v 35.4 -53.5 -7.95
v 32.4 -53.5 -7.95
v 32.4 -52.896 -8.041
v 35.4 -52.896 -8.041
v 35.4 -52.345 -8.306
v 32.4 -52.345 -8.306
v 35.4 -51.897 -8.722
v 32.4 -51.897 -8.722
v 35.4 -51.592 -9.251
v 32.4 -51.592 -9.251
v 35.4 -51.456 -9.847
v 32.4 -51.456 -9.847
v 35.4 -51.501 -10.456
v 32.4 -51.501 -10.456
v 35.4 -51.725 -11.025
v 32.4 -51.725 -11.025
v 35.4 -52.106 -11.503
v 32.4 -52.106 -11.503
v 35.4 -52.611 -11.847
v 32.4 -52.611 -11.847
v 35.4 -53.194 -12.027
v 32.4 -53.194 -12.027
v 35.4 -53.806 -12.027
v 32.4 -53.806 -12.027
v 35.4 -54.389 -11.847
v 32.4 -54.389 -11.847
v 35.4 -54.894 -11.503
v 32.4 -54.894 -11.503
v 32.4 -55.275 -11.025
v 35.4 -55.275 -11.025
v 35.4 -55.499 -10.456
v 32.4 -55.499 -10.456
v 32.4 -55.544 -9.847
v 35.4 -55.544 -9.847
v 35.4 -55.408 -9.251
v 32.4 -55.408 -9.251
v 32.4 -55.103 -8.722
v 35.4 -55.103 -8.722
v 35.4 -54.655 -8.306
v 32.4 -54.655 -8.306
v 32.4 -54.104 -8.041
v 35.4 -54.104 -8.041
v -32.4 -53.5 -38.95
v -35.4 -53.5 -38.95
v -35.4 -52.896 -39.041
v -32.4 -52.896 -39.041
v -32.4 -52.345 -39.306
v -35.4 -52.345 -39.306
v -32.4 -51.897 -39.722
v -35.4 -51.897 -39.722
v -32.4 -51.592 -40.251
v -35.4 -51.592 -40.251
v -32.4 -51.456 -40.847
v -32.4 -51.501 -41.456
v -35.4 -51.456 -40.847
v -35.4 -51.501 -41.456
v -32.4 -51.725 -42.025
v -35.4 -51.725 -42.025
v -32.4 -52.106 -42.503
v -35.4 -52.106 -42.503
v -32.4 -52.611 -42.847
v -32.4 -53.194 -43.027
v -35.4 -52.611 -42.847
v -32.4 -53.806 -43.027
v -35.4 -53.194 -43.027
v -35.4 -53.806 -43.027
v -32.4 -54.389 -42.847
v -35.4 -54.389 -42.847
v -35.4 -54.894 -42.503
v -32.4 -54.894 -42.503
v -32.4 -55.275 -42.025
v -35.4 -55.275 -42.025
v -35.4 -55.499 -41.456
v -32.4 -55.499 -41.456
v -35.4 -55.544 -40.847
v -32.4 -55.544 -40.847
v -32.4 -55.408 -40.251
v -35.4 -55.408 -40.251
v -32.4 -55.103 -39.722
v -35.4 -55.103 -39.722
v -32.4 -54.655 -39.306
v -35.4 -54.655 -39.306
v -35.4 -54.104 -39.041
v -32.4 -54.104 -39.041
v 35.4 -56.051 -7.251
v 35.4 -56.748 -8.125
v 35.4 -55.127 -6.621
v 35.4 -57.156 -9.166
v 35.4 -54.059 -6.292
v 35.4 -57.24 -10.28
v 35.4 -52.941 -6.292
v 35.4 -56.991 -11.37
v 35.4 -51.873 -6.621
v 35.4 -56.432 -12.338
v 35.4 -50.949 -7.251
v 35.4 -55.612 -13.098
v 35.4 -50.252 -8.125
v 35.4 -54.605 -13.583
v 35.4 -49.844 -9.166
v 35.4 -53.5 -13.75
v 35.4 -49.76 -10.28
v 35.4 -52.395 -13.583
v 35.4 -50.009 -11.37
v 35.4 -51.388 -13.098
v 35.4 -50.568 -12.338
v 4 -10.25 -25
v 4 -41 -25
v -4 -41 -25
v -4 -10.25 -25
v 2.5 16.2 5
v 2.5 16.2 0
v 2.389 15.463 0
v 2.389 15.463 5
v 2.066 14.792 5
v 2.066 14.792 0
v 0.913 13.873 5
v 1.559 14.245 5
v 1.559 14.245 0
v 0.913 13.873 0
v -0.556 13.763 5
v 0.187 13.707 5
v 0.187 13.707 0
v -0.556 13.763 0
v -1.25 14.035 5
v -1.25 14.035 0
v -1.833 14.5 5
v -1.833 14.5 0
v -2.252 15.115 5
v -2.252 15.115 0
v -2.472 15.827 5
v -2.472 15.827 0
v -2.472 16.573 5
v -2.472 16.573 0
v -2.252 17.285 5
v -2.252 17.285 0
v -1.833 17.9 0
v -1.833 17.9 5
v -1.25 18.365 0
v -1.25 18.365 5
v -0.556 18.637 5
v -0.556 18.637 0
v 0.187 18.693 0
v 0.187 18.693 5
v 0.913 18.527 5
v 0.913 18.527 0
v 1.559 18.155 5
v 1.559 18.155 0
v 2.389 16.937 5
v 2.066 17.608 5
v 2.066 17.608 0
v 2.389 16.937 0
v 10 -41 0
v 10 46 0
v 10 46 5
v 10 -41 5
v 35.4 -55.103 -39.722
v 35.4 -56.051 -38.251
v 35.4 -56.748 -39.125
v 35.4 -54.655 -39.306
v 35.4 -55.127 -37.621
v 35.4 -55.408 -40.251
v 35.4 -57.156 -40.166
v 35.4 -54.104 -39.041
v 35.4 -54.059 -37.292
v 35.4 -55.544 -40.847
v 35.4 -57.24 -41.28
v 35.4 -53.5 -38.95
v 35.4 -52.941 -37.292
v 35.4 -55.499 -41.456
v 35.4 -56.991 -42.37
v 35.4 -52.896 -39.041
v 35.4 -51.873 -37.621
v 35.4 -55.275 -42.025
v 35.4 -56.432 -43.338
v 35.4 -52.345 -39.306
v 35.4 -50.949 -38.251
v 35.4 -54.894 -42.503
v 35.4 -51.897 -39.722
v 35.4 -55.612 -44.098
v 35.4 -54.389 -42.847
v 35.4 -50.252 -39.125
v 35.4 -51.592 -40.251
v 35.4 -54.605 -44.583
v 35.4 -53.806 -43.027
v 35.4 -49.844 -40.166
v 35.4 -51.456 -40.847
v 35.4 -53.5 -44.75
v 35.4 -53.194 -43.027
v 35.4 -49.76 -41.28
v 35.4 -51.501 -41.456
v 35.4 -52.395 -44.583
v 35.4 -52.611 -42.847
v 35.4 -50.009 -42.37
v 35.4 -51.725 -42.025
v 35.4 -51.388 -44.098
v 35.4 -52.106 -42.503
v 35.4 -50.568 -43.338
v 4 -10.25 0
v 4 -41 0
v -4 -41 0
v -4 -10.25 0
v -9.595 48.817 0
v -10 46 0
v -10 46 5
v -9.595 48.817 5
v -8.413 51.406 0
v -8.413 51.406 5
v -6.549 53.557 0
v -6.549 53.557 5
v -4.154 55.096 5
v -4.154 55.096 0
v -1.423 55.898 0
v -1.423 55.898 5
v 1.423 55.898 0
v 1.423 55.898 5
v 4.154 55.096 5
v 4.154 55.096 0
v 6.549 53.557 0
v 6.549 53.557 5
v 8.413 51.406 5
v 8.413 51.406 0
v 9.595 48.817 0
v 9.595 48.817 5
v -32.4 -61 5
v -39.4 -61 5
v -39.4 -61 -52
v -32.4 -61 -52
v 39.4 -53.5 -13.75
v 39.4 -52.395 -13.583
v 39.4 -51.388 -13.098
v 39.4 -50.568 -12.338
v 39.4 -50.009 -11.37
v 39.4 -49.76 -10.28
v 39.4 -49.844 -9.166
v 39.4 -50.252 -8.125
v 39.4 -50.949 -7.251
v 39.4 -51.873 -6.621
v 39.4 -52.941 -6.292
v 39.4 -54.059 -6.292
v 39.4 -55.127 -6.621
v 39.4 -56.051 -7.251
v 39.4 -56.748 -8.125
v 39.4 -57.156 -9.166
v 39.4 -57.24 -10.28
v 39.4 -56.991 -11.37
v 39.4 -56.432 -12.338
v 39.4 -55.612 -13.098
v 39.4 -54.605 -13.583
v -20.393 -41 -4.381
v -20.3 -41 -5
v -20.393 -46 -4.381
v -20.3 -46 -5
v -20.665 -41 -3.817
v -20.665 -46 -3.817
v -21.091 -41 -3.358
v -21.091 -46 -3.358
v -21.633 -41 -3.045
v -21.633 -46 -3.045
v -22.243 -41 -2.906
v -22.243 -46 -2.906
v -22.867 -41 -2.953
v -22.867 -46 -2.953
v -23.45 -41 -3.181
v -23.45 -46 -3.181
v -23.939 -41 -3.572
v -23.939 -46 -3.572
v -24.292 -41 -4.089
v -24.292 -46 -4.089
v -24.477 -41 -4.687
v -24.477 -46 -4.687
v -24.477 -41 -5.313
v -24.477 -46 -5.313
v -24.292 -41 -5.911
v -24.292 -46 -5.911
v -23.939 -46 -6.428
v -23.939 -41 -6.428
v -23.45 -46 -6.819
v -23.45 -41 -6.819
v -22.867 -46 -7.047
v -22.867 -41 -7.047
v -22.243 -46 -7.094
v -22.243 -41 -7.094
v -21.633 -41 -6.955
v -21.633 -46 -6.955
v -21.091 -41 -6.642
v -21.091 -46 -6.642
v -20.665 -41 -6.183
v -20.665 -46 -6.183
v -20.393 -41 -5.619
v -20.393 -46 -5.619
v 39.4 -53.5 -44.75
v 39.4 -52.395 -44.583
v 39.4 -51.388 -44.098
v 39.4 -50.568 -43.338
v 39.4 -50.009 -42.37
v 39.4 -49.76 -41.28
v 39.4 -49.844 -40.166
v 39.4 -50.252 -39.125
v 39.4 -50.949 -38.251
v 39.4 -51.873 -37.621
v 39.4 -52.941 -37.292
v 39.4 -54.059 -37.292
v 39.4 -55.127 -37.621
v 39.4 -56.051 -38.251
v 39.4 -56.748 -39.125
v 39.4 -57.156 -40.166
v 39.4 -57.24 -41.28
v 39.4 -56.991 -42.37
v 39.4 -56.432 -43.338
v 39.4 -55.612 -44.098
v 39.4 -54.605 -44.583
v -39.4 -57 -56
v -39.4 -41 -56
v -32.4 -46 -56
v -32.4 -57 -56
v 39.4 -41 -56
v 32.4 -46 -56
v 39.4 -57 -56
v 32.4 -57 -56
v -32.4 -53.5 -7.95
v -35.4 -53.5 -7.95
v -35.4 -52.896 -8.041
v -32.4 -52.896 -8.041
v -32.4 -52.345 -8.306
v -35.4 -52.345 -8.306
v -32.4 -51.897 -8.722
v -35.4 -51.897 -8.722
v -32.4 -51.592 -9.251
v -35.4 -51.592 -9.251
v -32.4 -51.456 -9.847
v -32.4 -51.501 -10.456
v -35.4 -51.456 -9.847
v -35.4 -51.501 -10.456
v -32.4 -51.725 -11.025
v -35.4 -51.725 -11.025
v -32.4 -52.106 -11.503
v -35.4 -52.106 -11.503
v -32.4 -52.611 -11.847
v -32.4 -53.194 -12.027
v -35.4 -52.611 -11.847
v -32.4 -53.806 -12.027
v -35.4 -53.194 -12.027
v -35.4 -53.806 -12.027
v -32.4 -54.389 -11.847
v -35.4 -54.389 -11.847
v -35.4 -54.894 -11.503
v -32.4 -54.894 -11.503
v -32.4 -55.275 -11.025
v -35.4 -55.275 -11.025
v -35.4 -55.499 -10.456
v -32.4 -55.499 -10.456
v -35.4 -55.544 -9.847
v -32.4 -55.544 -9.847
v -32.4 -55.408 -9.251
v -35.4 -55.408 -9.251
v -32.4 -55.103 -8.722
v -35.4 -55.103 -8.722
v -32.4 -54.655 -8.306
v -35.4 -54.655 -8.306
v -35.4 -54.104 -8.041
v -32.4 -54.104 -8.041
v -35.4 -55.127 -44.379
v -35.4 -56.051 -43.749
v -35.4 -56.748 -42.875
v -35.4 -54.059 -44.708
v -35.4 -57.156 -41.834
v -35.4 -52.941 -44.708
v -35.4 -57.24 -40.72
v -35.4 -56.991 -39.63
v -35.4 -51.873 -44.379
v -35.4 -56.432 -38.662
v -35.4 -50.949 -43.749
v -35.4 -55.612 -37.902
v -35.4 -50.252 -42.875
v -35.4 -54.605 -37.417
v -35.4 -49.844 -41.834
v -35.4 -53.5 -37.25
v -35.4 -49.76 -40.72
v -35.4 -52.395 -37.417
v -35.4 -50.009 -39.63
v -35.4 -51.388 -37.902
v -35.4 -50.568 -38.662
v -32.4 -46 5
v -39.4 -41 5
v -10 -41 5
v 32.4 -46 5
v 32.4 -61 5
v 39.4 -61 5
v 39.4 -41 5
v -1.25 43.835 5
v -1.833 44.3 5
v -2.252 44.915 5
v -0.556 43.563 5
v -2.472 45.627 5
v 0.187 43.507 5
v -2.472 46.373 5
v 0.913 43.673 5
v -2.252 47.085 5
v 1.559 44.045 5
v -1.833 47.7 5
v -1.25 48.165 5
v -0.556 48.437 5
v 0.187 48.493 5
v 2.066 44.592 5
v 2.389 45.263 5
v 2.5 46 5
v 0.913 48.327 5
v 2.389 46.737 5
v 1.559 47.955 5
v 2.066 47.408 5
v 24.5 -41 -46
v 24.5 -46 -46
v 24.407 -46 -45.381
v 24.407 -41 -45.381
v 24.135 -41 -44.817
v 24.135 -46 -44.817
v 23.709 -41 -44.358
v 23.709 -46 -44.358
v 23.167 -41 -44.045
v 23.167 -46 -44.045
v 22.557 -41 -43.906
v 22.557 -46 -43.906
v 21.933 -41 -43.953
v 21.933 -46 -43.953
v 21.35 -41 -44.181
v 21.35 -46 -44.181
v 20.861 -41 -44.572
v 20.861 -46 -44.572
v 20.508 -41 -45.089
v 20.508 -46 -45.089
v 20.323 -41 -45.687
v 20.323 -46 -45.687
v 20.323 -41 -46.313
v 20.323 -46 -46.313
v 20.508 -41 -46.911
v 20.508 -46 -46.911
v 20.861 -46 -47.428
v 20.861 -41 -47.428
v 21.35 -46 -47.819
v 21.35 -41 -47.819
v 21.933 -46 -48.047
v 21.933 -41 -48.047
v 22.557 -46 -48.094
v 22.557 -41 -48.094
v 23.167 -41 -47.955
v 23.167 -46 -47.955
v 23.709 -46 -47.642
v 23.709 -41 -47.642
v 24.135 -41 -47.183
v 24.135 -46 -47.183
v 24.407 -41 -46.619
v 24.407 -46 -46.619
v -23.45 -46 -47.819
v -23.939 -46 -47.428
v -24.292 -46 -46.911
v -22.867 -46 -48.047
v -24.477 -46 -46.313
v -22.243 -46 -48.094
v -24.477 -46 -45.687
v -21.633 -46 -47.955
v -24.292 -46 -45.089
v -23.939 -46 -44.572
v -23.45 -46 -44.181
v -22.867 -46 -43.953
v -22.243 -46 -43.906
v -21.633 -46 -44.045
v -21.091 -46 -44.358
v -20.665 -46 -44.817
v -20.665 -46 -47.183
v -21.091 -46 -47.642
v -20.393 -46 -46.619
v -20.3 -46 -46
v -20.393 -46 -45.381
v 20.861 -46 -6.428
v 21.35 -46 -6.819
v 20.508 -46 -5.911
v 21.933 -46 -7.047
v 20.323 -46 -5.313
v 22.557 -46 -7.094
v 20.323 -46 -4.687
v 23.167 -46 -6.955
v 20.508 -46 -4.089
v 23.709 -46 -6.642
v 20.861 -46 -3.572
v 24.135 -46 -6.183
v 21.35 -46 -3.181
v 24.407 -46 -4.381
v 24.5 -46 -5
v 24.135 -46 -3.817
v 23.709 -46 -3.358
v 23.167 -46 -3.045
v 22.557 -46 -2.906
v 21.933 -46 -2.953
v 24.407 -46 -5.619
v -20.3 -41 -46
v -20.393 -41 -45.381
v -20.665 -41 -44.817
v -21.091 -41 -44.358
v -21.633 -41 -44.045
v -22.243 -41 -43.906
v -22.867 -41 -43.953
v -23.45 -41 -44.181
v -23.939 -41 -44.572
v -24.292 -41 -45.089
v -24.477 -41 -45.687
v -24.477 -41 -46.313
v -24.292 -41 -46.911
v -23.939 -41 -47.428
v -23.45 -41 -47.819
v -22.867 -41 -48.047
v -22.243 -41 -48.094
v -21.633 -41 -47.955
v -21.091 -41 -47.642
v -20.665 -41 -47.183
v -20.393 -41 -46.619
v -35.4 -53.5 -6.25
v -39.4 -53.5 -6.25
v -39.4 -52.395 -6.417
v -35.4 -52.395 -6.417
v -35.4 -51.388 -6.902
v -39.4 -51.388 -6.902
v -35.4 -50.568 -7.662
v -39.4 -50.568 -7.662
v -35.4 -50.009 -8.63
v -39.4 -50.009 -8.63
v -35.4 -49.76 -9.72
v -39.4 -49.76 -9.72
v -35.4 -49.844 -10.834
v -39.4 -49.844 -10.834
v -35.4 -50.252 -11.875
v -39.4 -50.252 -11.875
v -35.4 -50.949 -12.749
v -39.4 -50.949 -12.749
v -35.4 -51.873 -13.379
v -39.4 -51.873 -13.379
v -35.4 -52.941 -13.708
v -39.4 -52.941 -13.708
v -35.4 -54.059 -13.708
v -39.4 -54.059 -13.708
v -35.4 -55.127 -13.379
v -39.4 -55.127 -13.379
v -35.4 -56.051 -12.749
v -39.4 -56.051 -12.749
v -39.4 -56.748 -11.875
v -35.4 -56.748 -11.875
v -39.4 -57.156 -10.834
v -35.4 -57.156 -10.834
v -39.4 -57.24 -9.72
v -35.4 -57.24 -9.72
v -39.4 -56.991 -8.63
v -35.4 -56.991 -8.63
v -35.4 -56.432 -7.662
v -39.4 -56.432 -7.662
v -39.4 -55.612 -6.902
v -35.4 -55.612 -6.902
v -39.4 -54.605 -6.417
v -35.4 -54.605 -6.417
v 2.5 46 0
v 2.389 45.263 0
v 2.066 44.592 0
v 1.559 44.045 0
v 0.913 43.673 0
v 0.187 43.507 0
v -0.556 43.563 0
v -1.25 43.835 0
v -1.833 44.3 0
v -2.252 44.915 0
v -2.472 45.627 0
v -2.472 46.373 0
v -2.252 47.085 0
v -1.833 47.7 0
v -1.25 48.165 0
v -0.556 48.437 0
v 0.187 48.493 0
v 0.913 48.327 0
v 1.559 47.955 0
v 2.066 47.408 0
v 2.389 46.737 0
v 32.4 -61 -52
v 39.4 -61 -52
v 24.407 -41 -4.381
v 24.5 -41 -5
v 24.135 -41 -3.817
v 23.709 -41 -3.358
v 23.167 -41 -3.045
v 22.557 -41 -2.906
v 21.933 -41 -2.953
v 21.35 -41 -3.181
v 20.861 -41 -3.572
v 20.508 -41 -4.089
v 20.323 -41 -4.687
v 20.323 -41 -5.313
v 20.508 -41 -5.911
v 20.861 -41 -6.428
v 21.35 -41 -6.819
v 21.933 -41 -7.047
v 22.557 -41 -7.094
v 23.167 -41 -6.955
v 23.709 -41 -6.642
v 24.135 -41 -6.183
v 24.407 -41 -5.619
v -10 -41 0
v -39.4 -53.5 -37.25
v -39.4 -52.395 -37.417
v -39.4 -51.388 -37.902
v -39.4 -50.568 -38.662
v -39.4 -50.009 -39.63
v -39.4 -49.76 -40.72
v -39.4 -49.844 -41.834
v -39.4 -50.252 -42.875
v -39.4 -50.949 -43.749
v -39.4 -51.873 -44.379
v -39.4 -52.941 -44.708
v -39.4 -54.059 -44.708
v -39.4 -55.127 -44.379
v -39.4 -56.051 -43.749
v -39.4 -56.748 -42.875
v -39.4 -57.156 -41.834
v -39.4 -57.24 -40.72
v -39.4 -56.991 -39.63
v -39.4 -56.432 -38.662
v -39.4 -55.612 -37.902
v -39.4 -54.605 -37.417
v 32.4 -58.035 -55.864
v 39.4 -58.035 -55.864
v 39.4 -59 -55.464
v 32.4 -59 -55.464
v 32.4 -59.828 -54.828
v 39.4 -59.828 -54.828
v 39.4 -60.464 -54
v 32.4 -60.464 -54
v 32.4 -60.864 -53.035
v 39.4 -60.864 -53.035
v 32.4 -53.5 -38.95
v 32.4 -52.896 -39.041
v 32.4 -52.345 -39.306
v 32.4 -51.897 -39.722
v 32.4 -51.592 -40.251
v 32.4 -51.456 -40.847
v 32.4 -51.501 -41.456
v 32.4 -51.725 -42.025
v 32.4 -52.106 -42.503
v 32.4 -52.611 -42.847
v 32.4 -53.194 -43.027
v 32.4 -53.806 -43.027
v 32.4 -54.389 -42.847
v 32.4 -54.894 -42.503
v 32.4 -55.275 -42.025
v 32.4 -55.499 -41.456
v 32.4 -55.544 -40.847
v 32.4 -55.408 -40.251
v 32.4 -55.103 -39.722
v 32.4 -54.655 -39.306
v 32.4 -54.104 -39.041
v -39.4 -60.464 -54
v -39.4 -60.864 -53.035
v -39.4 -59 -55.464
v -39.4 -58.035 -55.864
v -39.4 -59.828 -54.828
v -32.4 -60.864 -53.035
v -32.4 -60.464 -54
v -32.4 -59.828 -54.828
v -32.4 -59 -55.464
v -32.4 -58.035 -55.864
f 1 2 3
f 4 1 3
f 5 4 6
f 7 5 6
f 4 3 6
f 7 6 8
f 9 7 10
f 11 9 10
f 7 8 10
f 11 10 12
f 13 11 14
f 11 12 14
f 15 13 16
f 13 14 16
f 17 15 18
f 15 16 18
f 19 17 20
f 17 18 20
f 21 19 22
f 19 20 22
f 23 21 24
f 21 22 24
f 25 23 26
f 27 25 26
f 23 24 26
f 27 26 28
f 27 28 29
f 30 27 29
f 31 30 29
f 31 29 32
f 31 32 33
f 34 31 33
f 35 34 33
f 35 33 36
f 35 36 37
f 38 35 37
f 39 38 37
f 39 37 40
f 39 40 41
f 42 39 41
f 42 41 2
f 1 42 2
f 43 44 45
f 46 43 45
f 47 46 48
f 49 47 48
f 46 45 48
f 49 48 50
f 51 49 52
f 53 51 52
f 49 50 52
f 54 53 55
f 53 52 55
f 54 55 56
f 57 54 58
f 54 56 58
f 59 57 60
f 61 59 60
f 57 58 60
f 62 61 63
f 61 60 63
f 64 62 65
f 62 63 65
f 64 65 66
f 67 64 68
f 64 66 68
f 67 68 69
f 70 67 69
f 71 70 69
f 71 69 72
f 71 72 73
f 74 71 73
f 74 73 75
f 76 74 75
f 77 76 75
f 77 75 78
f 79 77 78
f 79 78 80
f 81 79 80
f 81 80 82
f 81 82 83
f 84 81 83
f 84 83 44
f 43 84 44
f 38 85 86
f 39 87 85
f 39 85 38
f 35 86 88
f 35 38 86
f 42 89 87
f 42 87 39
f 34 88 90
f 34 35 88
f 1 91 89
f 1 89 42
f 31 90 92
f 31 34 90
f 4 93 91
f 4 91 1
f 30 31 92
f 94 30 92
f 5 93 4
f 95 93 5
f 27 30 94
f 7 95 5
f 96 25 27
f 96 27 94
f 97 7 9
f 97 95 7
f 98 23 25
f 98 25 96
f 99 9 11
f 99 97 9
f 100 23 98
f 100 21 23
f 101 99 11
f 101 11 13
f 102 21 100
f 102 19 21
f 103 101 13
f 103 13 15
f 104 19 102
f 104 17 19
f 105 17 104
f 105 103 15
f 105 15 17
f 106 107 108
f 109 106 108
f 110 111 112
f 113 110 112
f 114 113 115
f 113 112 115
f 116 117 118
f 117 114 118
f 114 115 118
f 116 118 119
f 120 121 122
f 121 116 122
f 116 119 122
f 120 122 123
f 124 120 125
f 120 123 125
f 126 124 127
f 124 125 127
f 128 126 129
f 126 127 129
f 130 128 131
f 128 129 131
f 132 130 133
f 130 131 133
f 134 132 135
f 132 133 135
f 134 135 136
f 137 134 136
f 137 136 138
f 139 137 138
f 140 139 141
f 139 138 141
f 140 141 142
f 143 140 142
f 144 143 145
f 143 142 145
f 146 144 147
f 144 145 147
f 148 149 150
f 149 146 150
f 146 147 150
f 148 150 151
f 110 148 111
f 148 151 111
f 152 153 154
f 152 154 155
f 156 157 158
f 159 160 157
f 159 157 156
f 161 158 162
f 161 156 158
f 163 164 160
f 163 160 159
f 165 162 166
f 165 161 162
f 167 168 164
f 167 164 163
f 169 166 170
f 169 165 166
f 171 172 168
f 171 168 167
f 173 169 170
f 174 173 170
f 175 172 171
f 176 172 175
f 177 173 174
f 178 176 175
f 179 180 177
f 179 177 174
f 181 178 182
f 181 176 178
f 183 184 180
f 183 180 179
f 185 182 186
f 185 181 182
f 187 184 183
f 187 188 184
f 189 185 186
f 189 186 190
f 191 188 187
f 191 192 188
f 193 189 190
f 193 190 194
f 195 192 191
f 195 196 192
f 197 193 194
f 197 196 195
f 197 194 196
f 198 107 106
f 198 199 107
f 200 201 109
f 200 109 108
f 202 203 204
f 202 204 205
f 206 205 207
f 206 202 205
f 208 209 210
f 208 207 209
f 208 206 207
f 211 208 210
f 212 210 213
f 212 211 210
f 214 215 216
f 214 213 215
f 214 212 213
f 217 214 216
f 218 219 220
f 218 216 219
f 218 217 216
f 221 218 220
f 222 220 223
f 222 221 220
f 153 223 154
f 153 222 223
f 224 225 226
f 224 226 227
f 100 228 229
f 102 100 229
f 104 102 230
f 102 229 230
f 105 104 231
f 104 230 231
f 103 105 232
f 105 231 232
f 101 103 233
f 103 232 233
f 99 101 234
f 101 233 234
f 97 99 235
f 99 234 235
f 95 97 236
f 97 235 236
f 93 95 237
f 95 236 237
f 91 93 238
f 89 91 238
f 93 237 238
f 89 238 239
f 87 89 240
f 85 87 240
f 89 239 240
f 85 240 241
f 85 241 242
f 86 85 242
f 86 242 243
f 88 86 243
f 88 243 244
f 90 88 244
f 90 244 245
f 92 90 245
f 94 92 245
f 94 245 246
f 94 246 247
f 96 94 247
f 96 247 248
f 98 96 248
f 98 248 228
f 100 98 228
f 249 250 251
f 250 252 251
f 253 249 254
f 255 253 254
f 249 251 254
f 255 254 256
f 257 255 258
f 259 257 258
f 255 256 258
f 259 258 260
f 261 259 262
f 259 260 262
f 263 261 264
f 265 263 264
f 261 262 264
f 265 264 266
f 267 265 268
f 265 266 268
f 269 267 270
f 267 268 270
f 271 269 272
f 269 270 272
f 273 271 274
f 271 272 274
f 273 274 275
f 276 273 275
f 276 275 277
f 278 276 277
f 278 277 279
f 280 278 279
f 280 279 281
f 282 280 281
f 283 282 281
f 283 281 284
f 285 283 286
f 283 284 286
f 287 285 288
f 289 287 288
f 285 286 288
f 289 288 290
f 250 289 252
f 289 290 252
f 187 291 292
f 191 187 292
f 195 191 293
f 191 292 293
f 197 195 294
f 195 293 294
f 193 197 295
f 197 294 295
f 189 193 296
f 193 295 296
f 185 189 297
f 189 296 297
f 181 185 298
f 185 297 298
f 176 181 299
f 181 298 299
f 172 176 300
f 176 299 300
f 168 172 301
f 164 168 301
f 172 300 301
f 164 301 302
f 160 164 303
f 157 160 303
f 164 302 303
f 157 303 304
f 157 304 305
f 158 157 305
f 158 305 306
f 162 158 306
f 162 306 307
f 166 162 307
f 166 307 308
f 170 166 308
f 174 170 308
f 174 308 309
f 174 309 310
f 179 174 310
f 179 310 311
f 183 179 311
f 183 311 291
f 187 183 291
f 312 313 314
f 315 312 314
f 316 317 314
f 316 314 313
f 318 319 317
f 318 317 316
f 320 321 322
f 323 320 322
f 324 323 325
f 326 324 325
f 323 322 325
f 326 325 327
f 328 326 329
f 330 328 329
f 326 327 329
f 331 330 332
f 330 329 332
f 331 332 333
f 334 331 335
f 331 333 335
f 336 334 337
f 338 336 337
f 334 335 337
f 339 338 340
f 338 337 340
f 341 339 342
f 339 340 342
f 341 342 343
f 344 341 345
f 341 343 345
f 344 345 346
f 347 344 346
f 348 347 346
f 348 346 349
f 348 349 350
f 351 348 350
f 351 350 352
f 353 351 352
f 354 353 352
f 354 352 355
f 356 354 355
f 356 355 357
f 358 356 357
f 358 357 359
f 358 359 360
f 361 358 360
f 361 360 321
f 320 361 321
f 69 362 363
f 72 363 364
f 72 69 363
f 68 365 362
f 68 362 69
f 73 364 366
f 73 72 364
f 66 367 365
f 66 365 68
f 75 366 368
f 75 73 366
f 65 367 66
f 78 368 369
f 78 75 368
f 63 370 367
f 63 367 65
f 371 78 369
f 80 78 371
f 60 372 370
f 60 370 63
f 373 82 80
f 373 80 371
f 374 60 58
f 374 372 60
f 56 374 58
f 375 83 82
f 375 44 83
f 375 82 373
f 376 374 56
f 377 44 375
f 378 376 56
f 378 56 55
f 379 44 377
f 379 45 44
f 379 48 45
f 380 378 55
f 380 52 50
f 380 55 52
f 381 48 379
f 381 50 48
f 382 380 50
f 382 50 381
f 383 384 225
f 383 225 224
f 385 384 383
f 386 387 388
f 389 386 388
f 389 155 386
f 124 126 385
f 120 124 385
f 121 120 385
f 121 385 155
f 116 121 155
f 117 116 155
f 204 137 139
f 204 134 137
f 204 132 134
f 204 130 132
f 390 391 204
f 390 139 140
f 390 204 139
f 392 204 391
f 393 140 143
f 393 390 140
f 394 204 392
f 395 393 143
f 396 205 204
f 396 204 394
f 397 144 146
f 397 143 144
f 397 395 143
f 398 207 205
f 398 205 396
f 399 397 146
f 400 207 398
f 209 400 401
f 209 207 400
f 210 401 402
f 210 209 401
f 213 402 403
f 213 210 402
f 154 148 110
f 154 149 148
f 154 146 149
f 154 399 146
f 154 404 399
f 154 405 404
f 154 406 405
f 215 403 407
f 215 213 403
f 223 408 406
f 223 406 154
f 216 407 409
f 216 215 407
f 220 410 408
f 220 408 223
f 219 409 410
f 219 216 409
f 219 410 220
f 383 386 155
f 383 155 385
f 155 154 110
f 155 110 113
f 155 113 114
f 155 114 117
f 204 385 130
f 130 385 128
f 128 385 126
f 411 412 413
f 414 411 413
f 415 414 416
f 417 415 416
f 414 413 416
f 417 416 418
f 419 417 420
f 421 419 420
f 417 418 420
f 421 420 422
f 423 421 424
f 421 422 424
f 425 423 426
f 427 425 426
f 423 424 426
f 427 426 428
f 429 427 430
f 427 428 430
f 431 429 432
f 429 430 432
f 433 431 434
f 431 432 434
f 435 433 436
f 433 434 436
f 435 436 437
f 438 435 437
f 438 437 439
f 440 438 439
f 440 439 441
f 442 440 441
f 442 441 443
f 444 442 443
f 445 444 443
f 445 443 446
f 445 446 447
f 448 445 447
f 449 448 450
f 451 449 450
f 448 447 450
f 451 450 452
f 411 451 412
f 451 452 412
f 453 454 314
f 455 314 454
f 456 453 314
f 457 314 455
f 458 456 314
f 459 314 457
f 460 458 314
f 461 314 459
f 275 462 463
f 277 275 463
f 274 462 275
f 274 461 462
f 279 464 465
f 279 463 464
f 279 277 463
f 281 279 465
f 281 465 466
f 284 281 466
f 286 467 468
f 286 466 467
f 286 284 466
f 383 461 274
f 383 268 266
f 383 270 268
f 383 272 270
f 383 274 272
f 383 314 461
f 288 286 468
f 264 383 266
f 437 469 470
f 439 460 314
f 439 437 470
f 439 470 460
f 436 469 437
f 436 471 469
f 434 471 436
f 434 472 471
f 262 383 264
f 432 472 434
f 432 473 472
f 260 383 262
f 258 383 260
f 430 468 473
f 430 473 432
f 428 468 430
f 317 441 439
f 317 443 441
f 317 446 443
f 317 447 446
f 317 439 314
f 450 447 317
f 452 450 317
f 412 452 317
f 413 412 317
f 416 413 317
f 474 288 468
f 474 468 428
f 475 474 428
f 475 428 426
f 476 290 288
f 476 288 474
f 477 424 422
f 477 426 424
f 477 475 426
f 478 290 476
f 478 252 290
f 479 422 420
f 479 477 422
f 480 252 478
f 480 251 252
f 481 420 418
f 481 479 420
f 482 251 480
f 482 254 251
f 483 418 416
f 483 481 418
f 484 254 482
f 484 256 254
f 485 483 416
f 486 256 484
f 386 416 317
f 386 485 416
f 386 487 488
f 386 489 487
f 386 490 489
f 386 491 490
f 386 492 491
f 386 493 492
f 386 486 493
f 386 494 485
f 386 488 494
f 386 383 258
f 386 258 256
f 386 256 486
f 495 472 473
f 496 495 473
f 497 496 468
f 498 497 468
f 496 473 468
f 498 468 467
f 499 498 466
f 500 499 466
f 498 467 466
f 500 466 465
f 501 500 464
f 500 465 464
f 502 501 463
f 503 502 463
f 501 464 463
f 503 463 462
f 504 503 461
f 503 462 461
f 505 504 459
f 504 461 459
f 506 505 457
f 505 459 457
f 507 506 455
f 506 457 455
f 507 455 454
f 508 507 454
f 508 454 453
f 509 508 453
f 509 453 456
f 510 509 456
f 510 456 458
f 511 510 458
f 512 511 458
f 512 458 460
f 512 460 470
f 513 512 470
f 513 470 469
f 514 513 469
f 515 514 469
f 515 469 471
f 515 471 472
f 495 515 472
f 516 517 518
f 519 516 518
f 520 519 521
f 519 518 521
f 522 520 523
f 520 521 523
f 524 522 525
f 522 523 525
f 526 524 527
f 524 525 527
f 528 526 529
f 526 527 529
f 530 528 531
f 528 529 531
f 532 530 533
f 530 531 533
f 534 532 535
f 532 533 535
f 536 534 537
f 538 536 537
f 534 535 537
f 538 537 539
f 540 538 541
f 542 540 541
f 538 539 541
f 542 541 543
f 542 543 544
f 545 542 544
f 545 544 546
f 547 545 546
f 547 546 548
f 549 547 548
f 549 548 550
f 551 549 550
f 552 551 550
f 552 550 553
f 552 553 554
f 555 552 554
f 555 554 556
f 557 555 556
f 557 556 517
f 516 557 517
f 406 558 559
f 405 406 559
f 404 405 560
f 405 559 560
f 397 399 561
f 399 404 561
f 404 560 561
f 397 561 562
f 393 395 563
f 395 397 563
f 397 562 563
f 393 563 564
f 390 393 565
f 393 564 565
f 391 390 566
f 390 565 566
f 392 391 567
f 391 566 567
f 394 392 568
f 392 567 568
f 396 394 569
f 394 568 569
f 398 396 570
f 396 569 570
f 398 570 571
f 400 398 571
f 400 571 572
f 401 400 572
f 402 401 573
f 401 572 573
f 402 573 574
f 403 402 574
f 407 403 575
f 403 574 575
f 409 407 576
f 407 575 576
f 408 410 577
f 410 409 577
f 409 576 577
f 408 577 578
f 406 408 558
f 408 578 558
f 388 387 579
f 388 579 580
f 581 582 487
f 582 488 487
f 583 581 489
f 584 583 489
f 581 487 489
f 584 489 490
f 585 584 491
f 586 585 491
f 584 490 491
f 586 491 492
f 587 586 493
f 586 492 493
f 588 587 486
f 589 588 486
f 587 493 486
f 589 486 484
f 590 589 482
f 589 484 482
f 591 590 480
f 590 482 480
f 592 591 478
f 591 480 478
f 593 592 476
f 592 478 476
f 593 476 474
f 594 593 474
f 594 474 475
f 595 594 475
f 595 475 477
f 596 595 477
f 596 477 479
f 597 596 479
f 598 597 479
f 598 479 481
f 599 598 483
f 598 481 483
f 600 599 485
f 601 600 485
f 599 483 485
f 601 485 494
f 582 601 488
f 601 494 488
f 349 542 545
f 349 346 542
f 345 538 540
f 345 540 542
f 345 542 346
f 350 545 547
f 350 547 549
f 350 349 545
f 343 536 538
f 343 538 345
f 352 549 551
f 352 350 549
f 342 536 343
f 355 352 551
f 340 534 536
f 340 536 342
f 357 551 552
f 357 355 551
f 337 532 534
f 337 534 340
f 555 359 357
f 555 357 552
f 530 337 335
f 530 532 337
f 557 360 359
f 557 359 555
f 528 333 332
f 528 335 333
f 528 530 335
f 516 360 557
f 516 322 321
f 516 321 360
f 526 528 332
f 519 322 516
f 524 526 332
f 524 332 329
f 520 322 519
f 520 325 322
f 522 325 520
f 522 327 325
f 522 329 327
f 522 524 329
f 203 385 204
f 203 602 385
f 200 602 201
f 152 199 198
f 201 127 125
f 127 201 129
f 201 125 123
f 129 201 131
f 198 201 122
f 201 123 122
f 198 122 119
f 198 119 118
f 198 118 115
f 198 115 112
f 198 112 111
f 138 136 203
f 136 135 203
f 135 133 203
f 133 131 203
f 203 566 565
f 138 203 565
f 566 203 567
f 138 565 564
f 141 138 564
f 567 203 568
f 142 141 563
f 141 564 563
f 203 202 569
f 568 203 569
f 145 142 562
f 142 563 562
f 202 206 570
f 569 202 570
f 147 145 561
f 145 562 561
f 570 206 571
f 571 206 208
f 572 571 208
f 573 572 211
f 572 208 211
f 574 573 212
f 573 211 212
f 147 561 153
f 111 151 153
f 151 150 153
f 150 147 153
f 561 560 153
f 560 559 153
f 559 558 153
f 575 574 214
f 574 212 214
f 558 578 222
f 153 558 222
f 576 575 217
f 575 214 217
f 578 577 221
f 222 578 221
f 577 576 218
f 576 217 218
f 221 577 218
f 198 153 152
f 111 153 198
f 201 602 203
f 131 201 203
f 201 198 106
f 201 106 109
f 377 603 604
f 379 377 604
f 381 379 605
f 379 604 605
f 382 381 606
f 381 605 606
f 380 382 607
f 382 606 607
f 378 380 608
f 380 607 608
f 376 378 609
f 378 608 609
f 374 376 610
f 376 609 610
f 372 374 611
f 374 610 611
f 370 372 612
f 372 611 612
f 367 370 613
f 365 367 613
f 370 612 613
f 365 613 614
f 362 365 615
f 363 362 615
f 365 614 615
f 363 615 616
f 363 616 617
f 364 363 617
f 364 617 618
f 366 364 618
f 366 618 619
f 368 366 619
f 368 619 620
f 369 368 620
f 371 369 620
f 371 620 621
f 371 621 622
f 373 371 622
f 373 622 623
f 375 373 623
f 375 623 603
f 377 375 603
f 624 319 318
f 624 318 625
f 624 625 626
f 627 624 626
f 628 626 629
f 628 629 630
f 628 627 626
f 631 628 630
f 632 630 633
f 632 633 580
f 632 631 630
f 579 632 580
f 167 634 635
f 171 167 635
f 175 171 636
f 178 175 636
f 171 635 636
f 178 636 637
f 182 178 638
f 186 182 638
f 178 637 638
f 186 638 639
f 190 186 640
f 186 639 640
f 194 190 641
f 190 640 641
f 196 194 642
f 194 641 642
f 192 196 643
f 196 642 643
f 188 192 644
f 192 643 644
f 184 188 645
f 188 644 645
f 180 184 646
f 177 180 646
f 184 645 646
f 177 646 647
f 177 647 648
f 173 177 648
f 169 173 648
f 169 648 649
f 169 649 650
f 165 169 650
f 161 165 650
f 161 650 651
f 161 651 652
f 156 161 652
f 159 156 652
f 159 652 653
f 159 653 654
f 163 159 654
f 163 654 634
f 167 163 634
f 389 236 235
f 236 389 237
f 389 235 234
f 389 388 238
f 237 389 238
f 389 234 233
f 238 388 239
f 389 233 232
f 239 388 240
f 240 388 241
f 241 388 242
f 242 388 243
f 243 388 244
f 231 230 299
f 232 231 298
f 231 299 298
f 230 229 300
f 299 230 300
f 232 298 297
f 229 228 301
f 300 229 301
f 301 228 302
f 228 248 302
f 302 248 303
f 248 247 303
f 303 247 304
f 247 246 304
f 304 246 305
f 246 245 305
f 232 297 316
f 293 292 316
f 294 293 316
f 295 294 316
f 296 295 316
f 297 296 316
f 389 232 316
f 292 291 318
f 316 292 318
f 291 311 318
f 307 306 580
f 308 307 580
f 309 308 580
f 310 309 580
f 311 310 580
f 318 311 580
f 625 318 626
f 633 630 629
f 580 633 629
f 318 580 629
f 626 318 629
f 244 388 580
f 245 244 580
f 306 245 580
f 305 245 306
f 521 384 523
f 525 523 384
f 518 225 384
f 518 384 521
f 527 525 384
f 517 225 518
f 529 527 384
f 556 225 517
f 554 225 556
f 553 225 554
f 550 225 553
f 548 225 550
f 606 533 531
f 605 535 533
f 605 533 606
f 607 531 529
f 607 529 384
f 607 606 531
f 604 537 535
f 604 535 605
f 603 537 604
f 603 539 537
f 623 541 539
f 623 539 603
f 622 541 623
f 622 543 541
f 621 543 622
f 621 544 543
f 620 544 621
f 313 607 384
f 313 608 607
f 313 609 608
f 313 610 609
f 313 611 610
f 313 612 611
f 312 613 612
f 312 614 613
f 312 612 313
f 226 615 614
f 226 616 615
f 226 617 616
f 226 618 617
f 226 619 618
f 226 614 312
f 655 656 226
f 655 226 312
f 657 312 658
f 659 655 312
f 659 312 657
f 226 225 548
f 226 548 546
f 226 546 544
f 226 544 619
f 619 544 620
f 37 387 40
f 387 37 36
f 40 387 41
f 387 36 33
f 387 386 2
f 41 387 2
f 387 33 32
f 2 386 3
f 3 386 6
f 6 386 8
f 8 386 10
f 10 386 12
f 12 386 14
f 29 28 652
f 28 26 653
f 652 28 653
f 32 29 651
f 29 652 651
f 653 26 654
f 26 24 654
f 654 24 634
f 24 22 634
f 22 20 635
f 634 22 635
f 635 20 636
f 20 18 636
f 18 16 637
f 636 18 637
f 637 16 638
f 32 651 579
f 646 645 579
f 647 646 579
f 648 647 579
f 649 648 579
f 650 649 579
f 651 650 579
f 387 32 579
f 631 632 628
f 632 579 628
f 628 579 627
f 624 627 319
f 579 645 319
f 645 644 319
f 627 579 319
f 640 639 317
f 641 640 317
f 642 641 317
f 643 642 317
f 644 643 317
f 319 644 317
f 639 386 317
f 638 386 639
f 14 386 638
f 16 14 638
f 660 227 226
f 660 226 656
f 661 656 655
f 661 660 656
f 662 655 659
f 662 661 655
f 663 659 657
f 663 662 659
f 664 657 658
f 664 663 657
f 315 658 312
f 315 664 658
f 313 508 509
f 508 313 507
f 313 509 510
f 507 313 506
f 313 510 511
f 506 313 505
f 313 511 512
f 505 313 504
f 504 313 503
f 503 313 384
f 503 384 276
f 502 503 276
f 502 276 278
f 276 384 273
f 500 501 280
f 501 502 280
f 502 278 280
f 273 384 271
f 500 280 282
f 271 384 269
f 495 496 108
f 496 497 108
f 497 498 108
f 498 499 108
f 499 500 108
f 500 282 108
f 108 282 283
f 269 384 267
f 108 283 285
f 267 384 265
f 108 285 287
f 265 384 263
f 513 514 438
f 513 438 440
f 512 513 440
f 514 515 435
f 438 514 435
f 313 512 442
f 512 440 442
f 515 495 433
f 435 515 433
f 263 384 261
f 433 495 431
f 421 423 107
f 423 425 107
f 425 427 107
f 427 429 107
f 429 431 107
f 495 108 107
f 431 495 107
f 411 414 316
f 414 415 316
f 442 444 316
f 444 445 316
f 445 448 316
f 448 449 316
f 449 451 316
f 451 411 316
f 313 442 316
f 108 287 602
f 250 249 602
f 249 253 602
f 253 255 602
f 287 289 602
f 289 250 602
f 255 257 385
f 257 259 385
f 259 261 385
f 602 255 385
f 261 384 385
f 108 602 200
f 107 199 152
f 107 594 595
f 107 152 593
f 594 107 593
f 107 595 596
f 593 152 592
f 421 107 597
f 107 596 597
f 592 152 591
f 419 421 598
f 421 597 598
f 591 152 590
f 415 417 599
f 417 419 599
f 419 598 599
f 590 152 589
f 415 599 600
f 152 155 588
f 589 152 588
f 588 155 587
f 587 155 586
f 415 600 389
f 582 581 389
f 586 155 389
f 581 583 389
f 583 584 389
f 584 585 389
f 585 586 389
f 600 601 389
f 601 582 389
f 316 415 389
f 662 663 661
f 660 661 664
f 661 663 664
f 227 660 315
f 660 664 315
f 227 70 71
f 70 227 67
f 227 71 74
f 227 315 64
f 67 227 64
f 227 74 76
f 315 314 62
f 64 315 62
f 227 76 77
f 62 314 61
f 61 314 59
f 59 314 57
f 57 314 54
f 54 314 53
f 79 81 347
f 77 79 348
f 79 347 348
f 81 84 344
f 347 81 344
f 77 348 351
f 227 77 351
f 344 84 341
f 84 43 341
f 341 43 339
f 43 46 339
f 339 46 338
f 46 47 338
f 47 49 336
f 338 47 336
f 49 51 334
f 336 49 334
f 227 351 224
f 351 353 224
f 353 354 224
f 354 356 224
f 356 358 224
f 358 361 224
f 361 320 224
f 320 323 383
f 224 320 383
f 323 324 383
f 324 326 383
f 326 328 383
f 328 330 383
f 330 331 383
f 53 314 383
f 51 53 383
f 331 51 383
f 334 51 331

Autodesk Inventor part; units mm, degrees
ref_plane "YZ Plane" through (0, 0, 0) normal (1, 0, 0) x (0, 1, 0)
ref_plane "XZ Plane" through (0, 0, 0) normal (0, 1, 0) x (-1, 0, 0)
ref_plane "XY Plane" through (0, 0, 0) normal (0, 0, 1) x (1, 0, 0)
sketch "Esquisse1" plane through (0, 0, 0) normal (0, 0, 1) x (1, 0, 0)
  line L0 (-10, 46) -> (10, 46) construction
  line L1 (10, 46) -> (10, -46)
  line L2 (10, -46) -> (-10, -46)
  line L3 (-10, -46) -> (-10, 46)
  line L4 (-10, 46) -> (10, -46) construction
  line L5 (10, 46) -> (-10, -46) construction
  arc A0 (10, 46) -> (-10, 46) centre (0, 46) ccw
  circle A1 centre (0, 46) radius 2.5
  line L6 (0, 46) -> (0, 16.2) construction
  circle A2 centre (0, 16.2) radius 2.5
  point P0 (0, 0)
  dimension "d0" = 29.8
  dimension "d1" = 5
  dimension "d2" = 20
  dimension "d3" = 92
extrude "Extrusion1" add sketch "Esquisse1" along normal blind 5
sketch "Esquisse2" plane through (-10, -46, 0) normal (0, -1, 0) x (1, 0, 0)
  line L0 (-22.4, -56) -> (-22.4, 5)
  line L1 (-22.4, 5) -> (42.4, 5)
  line L2 (42.4, 5) -> (42.4, -56)
  line L3 (42.4, -56) -> (-22.4, -56)
  line L4 (-22.4, -56) -> (42.4, 5) construction
  line L5 (-22.4, 5) -> (42.4, -56) construction
  line L6 (0, 5) -> (20, 5) projected
  line L7 (0, 5) -> (20, 5)
  line L8 (20, 0) -> (20, 5) projected
  line L9 (0, 0) -> (0, 5) projected
  line L10 (0, 0) -> (20, 0) projected
  line L11 (10, -25.5) -> (10, 0) construction
  line L12 (32.4, -46) -> (-12.4, -46) construction
  line L13 (-12.4, -46) -> (-12.4, -5) construction
  line L14 (-12.4, -5) -> (32.4, -5) construction
  line L15 (32.4, -5) -> (32.4, -46) construction
  line L16 (32.4, -46) -> (-12.4, -5) construction
  line L17 (-12.4, -46) -> (32.4, -5) construction
  circle A0 centre (-12.4, -46) radius 2.1
  circle A1 centre (32.4, -46) radius 2.1
  circle A2 centre (32.4, -5) radius 2.1
  circle A3 centre (-12.4, -5) radius 2.1
  line L18 (-22.4, 5) -> (-29.4, 5)
  line L19 (-29.4, 5) -> (-29.4, -56)
  line L20 (-29.4, -56) -> (-22.4, -56)
  line L21 (-22.4, -56) -> (-22.4, 5)
  line L22 (42.4, 5) -> (49.4, 5)
  line L23 (49.4, 5) -> (49.4, -56)
  line L24 (49.4, -56) -> (42.4, -56)
  line L25 (42.4, -56) -> (42.4, 5)
  dimension "d7" = 64.8
  dimension "d8" = 61
  dimension "d49" = 10
  dimension "d50" = 10
  dimension "d51" = 4.2
  dimension "d53" = 7
extrude "Extrusion2" add sketch "Esquisse2" against normal blind 5
sketch "Esquisse10" plane through (0, 0, 0) normal (0, 0, -1) x (-1, 0, 0)
  line L0 (-4, -10.25) -> (4, -10.25)
  line L1 (4, -10.25) -> (4, -41)
  line L2 (4, -41) -> (-4, -41)
  line L3 (-4, -41) -> (-4, -10.25)
  line L4 (-4, -10.25) -> (4, -41) construction
  line L5 (4, -10.25) -> (-4, -41) construction
  line L6 (0, 0) -> (0, -25.625) construction
  line L7 (-4, -41) -> (4, -41)
  line L8 (4, -41) -> (4, -46)
  line L9 (4, -46) -> (-4, -46)
  line L10 (-4, -46) -> (-4, -41)
  line L11 (-10, -41) -> (10, -41) projected
  dimension "d41" = 8
  dimension "d48" = 30.75
extrude "Extrusion8" add sketch "Esquisse10" along normal blind 25
extrude "Extrusion10" add sketch "Esquisse2" along normal blind 15 contours L20 L19 L18 L0 | L2 L22 L23 L24
fillet "Congé2" radius 4 2 edges at (35.9, -61, -56) (-35.9, -61, -56)
sketch "Esquisse12" plane through (-39.4, -41, -56) normal (-1, 0, 0) x (0, 0, 1)
  arc A0 (0, -16) -> (4, -20) centre (4, -16) ccw projected
  line L0 (61, -20) -> (4, -20) projected
  line L1 (61, 0) -> (61, -20) projected
  line L2 (0, 0) -> (61, 0) projected
  line L3 (0, -16) -> (0, 0) projected
  line L4 (61, -5) -> (0, -5) projected
  line L5 (0, -5) -> (61, -5) projected
  line L6 (61, 0) -> (61, -20) projected
  line L7 (0, -5) -> (61, -5)
  line L8 (61, -5) -> (61, -20)
  line L9 (61, -20) -> (0, -20)
  line L10 (0, -20) -> (0, -5)
  line L11 (0, -5) -> (0, -16) projected
  line L12 (0, -12.5) -> (15, -12.5) construction
  line L13 (15, -12.5) -> (46, -12.5) construction
  line L14 (46, -12.5) -> (61, -12.5) construction
  circle A1 centre (15, -12.5) radius 2.05
  circle A2 centre (46, -12.5) radius 2.05
  circle A3 centre (15, -12.5) radius 3.75
  circle A4 centre (46, -12.5) radius 3.75
  point P0 (56, 41)
  dimension "d57" = 4.1
  dimension "d59" = 15
  dimension "d62" = 15
  dimension "d63" = 7.5
extrude "Extrusion11" cut sketch "Esquisse12" against normal through all contours A1 | A2
extrude "Extrusion12" cut sketch "Esquisse12" against normal blind 4 contours A3 | A4
sketch "Esquisse13" plane through (39.4, -41, 5) normal (1, 0, 0) x (0, 0, -1)
  circle A0 centre (46, -12.5) radius 3.75 projected
  circle A1 centre (15, -12.5) radius 3.75 projected
  point P0 (5, 41)
extrude "Extrusion13" cut sketch "Esquisse13" against normal blind 4
properties part number "Support_batterie_réduit"
